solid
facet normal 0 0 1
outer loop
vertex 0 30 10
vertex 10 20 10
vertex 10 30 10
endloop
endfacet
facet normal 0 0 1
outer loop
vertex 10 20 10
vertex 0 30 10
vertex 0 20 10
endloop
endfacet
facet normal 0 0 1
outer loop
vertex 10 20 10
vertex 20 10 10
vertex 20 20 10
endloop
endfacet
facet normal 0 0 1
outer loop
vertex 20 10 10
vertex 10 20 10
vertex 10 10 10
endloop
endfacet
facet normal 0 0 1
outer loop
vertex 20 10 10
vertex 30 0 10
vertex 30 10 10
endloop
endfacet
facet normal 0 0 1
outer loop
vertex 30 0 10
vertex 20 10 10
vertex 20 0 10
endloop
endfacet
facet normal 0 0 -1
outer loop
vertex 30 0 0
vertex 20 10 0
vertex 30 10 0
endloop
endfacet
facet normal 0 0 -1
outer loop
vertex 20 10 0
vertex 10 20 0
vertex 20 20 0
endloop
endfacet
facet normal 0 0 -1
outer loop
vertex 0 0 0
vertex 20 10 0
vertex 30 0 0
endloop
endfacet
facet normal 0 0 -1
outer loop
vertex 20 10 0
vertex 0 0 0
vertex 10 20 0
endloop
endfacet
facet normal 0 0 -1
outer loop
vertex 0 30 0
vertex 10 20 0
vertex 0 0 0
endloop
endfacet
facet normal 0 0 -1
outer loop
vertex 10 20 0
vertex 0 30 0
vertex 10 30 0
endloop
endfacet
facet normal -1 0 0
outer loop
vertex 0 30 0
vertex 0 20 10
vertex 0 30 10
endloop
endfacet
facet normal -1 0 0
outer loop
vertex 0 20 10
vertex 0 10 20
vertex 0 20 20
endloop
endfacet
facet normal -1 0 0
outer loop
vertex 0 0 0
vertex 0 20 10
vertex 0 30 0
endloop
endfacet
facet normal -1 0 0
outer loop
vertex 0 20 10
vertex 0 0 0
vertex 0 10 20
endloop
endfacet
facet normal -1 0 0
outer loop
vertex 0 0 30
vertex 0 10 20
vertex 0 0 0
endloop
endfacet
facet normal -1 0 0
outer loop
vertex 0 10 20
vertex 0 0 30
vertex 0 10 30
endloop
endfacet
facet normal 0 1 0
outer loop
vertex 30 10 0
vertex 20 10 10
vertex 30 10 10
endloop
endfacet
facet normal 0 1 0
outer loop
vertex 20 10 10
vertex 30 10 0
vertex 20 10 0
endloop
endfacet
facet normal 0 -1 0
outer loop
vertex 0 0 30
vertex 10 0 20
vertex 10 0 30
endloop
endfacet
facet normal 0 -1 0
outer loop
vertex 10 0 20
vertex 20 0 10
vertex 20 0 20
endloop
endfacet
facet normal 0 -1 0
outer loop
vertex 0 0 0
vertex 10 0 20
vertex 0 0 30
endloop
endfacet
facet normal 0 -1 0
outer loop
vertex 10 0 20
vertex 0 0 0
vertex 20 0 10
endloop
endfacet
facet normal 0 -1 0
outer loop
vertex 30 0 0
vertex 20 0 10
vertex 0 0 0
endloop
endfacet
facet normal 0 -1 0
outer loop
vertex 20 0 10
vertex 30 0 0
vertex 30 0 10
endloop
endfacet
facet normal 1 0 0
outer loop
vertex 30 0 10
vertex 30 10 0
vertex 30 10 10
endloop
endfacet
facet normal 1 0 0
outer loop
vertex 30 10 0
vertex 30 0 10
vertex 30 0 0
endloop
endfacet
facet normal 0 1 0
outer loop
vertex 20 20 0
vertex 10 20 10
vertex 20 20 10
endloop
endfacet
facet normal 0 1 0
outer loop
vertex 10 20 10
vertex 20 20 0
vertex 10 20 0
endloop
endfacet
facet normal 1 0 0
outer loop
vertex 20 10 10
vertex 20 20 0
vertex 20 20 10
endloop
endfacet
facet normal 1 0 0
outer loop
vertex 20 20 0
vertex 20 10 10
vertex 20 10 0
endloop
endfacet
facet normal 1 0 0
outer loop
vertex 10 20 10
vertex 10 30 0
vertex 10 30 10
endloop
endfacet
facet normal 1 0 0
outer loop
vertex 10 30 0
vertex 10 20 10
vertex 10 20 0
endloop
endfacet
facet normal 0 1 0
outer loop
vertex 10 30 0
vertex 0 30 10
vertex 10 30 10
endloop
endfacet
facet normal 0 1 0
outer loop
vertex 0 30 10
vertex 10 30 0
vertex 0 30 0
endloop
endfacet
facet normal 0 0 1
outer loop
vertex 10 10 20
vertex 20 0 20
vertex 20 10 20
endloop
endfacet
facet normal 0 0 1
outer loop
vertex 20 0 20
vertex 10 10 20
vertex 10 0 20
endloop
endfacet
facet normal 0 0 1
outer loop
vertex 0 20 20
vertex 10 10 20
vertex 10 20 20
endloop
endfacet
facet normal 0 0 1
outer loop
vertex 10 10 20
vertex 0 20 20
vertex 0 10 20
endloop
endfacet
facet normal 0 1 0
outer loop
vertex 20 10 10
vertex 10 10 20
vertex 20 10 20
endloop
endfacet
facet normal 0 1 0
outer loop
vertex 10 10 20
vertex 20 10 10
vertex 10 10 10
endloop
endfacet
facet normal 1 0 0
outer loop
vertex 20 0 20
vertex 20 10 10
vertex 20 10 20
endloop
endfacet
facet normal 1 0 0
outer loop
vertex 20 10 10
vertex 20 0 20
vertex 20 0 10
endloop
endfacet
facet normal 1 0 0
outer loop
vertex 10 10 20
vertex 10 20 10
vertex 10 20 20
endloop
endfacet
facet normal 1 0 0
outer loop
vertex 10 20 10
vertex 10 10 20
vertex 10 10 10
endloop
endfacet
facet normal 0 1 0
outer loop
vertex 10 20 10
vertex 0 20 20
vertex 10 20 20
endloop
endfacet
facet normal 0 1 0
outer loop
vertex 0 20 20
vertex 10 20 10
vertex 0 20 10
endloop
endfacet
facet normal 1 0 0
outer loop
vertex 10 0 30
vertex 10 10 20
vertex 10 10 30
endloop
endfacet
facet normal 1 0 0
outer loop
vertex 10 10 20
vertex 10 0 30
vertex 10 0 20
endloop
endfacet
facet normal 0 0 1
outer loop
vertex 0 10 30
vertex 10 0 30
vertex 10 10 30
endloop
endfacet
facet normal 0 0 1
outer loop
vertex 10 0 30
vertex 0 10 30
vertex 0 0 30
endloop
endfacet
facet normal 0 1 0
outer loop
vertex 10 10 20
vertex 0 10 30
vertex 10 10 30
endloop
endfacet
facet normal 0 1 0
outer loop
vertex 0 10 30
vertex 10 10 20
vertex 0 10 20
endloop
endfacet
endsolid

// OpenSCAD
// calibration cube-pyramid

lado = 10;
for(k=[0:1:2]){
    for(j=[0:1:2-k]){
        for(i=[0:1: 2-k-j]){
            translate (lado*[i,j,k])
            cube(lado*[1,1,1]);
        }
    }
}
